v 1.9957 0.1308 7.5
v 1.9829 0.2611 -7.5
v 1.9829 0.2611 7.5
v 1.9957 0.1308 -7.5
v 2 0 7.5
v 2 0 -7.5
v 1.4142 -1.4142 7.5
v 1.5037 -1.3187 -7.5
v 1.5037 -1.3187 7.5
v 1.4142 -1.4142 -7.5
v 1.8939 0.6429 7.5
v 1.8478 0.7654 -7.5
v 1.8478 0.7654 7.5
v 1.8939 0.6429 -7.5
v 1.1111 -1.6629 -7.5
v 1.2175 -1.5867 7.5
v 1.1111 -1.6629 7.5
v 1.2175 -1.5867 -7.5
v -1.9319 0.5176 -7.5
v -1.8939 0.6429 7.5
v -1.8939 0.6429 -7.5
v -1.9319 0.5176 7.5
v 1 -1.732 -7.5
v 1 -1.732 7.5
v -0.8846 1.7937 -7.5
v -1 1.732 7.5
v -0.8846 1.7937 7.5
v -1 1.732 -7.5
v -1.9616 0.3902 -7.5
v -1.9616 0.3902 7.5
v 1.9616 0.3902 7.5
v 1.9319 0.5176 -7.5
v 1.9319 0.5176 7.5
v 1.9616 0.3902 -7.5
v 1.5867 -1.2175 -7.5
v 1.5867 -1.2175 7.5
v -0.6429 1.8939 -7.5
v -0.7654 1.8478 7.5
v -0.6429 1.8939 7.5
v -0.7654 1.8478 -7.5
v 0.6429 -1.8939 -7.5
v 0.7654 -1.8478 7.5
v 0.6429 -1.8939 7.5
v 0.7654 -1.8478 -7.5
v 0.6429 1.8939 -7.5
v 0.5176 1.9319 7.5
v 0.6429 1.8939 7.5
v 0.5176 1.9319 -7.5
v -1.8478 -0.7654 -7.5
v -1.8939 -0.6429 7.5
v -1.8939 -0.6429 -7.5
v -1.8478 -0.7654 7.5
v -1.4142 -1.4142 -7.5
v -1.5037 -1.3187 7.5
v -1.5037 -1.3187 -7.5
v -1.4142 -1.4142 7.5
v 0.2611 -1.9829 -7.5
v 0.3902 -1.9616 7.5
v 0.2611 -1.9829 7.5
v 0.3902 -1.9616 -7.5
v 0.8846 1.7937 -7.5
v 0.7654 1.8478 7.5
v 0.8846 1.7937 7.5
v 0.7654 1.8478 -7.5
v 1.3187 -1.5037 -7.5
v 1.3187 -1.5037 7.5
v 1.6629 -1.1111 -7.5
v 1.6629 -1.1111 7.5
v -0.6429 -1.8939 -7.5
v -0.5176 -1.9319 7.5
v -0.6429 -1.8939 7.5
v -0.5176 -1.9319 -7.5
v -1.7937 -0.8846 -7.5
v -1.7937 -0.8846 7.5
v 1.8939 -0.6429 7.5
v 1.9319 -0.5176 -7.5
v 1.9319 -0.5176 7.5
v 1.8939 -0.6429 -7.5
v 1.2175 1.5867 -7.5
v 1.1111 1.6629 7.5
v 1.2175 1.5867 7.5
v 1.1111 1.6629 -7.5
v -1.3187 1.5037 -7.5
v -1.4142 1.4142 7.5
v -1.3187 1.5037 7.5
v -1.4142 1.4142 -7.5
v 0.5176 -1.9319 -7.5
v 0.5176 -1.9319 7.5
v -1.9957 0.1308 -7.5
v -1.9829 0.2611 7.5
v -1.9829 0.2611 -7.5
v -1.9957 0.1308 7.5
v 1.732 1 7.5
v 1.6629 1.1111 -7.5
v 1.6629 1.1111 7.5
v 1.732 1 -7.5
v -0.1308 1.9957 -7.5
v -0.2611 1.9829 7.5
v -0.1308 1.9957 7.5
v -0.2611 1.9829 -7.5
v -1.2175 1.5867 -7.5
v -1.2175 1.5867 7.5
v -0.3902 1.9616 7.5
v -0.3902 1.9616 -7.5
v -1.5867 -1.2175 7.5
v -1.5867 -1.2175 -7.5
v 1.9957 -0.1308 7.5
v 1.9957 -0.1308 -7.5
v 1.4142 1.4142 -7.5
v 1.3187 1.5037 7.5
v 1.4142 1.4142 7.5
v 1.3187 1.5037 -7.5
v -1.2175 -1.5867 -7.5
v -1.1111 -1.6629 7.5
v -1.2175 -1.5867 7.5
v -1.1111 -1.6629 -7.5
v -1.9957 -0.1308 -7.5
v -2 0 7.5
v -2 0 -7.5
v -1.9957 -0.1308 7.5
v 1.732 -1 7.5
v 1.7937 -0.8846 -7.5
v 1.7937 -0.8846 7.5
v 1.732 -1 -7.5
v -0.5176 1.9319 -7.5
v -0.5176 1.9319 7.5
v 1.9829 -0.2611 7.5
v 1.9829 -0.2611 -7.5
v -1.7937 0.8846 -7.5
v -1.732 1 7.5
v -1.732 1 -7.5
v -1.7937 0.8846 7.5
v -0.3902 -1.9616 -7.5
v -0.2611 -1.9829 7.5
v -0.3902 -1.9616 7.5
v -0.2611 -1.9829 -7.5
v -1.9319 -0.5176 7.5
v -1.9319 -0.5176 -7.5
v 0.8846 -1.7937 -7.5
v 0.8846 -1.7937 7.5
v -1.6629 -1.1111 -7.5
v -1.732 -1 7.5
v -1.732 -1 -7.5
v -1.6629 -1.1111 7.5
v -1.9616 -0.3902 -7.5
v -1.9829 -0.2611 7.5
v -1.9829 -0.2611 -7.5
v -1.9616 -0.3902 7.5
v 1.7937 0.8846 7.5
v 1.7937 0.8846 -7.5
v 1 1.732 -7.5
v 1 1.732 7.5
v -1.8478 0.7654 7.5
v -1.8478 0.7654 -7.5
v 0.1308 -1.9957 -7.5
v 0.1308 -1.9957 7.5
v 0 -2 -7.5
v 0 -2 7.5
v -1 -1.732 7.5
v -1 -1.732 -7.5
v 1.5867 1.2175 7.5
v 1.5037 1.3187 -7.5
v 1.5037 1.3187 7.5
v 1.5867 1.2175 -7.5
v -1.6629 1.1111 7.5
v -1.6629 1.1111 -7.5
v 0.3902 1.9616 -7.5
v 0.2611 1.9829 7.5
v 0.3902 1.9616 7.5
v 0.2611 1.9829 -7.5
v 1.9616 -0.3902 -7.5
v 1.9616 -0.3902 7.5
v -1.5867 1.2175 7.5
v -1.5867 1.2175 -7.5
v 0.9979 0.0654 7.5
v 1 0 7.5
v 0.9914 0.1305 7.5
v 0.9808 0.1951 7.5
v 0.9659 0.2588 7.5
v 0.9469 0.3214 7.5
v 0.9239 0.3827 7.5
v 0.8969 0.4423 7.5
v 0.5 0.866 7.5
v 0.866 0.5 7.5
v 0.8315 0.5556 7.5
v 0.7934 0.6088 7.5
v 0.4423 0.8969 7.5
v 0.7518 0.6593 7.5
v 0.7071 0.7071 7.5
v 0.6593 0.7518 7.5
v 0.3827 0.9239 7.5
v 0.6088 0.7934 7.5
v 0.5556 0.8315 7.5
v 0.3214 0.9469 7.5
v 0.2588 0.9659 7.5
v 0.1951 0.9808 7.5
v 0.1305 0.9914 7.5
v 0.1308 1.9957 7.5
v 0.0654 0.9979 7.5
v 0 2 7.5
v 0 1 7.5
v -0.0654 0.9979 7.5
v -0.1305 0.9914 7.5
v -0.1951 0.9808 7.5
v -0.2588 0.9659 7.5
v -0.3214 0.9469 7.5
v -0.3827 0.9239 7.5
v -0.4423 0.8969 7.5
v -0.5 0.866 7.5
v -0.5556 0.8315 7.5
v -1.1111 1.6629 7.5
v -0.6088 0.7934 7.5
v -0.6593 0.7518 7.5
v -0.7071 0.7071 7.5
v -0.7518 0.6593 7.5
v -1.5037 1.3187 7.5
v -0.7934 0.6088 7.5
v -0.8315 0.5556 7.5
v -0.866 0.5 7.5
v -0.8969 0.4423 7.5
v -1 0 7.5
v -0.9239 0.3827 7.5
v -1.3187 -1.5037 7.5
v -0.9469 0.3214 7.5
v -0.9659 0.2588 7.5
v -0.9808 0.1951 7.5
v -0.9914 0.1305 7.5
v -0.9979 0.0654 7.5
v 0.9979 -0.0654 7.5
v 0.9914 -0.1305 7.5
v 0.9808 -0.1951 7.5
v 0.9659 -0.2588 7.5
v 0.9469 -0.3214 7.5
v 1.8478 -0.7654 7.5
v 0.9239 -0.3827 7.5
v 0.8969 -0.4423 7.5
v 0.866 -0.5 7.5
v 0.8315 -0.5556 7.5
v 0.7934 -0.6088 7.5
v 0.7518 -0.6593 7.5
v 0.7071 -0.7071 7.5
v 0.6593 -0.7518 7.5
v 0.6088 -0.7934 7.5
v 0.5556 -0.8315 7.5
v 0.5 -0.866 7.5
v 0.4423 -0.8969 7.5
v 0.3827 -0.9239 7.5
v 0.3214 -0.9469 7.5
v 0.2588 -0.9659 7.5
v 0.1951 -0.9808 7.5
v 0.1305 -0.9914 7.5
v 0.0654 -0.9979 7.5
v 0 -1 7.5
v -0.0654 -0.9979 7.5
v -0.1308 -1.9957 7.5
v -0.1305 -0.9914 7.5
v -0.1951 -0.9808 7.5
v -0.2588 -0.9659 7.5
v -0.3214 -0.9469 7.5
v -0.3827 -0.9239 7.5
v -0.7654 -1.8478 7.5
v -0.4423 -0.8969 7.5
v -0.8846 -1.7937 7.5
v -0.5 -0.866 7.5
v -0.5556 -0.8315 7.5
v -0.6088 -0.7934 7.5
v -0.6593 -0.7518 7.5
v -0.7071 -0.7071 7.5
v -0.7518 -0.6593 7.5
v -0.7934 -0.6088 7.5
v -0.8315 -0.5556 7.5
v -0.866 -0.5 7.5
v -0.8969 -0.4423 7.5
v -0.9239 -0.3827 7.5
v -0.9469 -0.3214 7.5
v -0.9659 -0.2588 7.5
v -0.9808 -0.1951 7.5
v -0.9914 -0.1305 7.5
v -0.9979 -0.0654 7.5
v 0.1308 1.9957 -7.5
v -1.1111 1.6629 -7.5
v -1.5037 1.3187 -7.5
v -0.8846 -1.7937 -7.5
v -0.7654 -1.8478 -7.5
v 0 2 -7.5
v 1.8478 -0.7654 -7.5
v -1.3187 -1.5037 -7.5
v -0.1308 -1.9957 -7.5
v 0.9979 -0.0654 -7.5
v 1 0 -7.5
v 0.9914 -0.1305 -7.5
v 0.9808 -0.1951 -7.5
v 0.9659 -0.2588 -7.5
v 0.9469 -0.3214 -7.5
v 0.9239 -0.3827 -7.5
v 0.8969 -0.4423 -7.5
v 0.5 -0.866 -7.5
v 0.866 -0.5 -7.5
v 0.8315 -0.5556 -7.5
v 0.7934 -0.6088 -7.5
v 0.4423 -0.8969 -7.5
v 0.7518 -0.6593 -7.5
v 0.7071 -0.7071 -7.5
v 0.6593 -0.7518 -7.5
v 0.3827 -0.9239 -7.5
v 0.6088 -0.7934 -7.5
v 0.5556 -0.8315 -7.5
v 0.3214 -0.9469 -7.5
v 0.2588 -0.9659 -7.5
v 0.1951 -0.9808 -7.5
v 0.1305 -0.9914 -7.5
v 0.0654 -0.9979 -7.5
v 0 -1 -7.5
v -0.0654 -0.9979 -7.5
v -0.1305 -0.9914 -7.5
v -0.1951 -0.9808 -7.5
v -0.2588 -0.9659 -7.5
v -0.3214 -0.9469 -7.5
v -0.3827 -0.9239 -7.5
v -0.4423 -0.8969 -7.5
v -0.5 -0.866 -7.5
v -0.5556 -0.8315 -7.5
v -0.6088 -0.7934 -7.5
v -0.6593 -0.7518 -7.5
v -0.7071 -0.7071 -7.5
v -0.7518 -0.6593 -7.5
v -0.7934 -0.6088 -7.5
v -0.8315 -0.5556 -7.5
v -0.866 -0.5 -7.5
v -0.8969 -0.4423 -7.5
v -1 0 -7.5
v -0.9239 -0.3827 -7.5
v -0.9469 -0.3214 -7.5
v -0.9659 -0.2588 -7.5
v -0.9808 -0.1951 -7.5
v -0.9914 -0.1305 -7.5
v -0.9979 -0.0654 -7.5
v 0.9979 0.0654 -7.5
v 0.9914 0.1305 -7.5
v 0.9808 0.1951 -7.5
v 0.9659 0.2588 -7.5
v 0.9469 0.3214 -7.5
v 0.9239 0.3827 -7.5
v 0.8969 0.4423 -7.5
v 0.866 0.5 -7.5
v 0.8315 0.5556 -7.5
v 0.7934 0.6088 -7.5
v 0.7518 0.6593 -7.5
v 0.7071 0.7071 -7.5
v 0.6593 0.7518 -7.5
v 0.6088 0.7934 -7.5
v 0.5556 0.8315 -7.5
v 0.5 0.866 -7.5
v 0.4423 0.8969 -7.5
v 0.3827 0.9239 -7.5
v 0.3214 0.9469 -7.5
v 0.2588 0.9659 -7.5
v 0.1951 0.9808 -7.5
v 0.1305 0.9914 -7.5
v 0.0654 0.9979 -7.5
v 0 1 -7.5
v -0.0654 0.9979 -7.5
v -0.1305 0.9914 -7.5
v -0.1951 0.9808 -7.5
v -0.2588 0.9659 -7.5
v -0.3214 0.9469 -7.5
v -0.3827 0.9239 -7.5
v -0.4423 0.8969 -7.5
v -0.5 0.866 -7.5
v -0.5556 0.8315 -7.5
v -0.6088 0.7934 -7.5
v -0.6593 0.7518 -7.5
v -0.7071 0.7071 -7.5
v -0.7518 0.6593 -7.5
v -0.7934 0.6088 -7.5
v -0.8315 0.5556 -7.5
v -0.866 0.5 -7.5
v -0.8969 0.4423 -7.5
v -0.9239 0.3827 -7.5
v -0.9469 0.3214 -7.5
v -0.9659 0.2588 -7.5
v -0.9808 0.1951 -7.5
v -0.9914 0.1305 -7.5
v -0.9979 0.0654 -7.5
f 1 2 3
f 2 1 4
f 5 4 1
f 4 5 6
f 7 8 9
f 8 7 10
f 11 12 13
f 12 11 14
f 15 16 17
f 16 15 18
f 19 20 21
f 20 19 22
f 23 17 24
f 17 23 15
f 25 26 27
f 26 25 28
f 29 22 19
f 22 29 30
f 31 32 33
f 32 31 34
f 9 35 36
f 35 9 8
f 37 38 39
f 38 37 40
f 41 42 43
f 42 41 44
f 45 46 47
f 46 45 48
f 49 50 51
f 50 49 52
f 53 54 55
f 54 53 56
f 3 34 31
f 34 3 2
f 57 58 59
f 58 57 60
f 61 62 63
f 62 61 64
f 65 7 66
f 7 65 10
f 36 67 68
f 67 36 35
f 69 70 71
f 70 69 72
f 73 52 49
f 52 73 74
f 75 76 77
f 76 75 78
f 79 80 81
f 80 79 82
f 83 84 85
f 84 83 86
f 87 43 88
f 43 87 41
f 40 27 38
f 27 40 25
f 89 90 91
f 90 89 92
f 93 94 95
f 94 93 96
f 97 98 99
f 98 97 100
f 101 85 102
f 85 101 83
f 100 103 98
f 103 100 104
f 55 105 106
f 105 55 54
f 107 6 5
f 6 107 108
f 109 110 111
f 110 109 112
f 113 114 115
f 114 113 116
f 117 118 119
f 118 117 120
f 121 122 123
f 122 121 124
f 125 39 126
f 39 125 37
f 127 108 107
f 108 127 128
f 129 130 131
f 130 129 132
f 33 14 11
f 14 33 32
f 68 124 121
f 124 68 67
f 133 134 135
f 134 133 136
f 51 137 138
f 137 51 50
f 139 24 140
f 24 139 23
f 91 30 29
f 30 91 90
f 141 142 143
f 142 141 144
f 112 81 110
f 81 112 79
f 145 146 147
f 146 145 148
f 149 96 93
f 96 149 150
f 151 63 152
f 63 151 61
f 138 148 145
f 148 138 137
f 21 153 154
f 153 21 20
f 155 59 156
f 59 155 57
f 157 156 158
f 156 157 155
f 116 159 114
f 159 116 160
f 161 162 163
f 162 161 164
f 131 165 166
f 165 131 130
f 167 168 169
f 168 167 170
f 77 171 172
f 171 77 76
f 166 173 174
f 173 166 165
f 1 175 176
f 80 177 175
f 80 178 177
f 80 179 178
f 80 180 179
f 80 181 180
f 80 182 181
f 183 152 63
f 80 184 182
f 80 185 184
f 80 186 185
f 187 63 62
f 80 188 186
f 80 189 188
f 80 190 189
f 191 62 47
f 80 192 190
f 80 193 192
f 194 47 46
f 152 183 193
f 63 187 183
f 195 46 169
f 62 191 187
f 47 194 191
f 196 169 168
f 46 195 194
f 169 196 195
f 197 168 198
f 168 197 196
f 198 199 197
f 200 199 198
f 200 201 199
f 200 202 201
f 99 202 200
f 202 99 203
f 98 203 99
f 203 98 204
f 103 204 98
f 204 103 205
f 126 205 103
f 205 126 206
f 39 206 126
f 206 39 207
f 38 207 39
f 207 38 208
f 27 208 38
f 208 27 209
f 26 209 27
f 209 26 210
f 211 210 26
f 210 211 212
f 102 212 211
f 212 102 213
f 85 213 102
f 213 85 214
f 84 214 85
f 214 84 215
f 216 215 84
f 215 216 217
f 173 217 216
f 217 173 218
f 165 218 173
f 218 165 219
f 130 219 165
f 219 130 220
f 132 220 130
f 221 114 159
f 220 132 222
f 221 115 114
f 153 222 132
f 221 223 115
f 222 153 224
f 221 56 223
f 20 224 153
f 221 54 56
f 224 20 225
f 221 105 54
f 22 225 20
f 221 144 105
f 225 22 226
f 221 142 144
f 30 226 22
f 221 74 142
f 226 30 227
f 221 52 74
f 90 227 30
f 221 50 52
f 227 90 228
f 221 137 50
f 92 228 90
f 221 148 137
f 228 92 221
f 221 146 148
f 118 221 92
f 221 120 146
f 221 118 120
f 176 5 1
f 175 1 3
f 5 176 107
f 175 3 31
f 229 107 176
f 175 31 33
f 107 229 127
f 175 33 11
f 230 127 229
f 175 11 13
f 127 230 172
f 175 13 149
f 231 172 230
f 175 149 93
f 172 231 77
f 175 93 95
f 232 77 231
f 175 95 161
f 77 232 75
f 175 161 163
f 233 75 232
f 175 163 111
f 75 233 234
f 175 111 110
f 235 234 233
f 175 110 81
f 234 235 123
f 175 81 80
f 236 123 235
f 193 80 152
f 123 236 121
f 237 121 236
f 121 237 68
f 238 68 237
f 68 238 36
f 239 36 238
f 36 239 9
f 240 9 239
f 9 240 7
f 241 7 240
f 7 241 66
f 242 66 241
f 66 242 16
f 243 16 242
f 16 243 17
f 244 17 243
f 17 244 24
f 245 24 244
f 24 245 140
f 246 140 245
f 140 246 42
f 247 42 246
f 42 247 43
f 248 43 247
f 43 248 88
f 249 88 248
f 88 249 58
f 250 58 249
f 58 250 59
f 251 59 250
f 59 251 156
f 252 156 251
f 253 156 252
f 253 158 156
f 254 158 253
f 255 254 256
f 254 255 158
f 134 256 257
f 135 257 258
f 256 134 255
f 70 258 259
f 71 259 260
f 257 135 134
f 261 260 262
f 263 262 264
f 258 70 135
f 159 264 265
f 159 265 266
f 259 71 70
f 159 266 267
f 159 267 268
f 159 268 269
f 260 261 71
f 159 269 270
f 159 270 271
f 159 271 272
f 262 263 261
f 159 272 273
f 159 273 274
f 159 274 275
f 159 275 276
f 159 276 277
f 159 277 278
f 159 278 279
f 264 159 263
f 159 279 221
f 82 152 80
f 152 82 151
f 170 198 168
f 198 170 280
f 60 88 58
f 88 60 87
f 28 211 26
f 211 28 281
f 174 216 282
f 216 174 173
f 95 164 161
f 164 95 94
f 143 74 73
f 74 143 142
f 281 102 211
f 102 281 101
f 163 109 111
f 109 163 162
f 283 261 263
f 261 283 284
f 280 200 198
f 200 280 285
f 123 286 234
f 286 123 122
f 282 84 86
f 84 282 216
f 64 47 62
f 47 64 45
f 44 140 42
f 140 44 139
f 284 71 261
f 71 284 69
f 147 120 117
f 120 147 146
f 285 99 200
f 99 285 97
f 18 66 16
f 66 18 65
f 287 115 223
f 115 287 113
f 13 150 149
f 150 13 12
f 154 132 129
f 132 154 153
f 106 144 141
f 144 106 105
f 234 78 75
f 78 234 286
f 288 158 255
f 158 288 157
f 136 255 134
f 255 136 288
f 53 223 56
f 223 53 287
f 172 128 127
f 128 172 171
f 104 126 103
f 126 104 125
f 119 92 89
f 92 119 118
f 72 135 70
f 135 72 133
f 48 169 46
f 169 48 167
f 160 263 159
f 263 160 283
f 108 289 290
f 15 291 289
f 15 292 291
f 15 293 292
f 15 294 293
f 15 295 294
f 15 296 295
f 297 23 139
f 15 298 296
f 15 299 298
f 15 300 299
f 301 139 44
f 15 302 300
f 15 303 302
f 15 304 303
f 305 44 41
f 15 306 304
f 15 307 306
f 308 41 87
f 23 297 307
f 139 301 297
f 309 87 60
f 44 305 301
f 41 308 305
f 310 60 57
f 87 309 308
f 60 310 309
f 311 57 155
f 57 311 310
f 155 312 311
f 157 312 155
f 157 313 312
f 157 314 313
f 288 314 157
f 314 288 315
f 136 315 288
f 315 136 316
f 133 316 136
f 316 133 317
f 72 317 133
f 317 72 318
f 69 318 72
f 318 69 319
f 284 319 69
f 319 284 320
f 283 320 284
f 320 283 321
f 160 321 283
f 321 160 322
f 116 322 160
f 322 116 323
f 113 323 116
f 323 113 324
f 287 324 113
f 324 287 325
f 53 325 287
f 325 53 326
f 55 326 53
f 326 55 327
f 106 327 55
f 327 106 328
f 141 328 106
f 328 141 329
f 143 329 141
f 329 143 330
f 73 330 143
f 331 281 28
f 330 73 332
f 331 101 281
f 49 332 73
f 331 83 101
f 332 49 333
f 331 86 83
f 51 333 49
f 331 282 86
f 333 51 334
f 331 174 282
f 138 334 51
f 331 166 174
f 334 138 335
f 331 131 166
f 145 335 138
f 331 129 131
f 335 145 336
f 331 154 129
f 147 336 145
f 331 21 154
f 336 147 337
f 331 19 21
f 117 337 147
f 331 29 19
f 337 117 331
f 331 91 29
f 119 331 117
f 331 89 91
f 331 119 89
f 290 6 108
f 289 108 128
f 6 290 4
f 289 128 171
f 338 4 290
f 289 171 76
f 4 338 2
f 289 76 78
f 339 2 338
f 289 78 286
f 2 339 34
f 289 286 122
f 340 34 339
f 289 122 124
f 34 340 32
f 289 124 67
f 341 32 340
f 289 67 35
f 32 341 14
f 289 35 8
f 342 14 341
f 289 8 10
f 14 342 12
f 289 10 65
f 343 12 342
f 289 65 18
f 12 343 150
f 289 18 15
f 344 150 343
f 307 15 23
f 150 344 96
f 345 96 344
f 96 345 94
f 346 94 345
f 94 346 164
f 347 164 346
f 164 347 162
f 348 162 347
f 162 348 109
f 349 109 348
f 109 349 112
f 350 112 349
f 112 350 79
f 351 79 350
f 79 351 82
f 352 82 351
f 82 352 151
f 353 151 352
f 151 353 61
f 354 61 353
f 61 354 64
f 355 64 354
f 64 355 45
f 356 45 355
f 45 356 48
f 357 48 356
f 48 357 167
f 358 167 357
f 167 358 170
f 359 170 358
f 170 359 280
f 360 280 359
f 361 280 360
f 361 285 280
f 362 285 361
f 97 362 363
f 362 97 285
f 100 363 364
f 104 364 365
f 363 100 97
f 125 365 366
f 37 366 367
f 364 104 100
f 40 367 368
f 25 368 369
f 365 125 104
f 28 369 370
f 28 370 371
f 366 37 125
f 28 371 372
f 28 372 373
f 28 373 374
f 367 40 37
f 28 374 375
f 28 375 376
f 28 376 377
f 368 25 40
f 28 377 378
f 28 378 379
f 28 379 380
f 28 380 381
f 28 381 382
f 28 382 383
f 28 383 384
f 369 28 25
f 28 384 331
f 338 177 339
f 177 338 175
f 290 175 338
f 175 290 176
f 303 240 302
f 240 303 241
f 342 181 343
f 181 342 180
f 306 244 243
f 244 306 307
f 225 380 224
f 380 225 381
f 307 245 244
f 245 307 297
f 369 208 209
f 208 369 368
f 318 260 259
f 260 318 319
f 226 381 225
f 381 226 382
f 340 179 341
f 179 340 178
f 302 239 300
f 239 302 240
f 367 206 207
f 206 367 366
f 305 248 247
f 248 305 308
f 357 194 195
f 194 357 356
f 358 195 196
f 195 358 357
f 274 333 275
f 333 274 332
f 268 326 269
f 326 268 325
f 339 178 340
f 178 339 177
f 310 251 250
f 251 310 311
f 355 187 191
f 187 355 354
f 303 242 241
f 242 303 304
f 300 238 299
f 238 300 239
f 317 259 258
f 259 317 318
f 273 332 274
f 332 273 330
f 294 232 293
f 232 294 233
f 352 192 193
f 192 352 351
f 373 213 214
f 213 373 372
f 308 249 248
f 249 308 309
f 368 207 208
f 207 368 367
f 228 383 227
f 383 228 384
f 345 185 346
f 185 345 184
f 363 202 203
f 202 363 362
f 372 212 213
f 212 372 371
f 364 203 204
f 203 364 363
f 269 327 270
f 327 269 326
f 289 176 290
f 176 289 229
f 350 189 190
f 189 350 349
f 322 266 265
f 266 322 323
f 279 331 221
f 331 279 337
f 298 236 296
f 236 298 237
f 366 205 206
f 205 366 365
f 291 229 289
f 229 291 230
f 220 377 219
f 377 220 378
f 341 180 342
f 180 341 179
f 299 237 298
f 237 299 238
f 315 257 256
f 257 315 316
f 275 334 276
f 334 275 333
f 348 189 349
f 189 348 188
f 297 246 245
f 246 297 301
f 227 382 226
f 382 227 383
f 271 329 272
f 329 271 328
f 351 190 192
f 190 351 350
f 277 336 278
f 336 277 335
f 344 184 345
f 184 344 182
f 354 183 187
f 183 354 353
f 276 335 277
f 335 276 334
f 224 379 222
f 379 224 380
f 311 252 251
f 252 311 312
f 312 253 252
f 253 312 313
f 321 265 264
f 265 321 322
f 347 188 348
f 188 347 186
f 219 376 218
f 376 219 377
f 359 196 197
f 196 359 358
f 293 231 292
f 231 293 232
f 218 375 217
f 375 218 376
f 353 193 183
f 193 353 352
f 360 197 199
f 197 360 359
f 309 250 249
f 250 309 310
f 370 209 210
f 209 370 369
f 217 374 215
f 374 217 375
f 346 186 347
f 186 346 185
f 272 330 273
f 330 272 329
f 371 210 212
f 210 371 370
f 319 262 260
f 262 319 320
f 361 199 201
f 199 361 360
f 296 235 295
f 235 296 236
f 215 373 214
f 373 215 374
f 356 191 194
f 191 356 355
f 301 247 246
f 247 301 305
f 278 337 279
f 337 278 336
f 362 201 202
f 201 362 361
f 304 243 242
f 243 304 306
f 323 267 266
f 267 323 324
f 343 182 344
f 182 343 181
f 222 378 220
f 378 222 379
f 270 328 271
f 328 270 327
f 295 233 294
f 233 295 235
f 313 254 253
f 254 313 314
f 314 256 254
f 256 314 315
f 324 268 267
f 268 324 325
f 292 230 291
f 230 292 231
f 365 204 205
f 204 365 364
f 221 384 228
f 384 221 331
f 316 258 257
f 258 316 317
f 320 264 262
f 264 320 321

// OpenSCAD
// PTFE Tubing (round tube with circular bore)

// Parameters
length = 15;          //[8:30:1]
forced_id = 0;        //[0:10:0.1]
center = 1;           //[0:1:1]
nominal_od = 4;       //[2:8:0.1]
nominal_id = 2;       //[1:6:0.1]
overlap = 1;          //[0.5:2:0.1]

// Smoothness
$fn = 96;

// Effective inner and outer diameters
id = (forced_id > 0) ? forced_id : nominal_id;
od = nominal_od + id - nominal_id;

// Safety clamps to ensure valid tube
id_eff = max(0.01, id);
od_eff = max(id_eff + 0.2, od);   // ensure wall thickness > 0

module tubing(h, od_d, id_d, centered=true) {
  color([0.85, 0.85, 0.8])  // Off-white PTFE
  difference() {
    cylinder(h=h, d=od_d, center=centered);
    // Ensure the bore fully cuts through regardless of centering
    cylinder(h=h + 2*overlap, d=id_d, center=centered);
  }
}

module assembly() {
  // If not centered, place tube on Z=0..length (not half-floating)
  zoff = (center == 1) ? 0 : length/2;
  translate([0, 0, zoff])
    tubing(length, od_eff, id_eff, centered=true);
}

assembly();
